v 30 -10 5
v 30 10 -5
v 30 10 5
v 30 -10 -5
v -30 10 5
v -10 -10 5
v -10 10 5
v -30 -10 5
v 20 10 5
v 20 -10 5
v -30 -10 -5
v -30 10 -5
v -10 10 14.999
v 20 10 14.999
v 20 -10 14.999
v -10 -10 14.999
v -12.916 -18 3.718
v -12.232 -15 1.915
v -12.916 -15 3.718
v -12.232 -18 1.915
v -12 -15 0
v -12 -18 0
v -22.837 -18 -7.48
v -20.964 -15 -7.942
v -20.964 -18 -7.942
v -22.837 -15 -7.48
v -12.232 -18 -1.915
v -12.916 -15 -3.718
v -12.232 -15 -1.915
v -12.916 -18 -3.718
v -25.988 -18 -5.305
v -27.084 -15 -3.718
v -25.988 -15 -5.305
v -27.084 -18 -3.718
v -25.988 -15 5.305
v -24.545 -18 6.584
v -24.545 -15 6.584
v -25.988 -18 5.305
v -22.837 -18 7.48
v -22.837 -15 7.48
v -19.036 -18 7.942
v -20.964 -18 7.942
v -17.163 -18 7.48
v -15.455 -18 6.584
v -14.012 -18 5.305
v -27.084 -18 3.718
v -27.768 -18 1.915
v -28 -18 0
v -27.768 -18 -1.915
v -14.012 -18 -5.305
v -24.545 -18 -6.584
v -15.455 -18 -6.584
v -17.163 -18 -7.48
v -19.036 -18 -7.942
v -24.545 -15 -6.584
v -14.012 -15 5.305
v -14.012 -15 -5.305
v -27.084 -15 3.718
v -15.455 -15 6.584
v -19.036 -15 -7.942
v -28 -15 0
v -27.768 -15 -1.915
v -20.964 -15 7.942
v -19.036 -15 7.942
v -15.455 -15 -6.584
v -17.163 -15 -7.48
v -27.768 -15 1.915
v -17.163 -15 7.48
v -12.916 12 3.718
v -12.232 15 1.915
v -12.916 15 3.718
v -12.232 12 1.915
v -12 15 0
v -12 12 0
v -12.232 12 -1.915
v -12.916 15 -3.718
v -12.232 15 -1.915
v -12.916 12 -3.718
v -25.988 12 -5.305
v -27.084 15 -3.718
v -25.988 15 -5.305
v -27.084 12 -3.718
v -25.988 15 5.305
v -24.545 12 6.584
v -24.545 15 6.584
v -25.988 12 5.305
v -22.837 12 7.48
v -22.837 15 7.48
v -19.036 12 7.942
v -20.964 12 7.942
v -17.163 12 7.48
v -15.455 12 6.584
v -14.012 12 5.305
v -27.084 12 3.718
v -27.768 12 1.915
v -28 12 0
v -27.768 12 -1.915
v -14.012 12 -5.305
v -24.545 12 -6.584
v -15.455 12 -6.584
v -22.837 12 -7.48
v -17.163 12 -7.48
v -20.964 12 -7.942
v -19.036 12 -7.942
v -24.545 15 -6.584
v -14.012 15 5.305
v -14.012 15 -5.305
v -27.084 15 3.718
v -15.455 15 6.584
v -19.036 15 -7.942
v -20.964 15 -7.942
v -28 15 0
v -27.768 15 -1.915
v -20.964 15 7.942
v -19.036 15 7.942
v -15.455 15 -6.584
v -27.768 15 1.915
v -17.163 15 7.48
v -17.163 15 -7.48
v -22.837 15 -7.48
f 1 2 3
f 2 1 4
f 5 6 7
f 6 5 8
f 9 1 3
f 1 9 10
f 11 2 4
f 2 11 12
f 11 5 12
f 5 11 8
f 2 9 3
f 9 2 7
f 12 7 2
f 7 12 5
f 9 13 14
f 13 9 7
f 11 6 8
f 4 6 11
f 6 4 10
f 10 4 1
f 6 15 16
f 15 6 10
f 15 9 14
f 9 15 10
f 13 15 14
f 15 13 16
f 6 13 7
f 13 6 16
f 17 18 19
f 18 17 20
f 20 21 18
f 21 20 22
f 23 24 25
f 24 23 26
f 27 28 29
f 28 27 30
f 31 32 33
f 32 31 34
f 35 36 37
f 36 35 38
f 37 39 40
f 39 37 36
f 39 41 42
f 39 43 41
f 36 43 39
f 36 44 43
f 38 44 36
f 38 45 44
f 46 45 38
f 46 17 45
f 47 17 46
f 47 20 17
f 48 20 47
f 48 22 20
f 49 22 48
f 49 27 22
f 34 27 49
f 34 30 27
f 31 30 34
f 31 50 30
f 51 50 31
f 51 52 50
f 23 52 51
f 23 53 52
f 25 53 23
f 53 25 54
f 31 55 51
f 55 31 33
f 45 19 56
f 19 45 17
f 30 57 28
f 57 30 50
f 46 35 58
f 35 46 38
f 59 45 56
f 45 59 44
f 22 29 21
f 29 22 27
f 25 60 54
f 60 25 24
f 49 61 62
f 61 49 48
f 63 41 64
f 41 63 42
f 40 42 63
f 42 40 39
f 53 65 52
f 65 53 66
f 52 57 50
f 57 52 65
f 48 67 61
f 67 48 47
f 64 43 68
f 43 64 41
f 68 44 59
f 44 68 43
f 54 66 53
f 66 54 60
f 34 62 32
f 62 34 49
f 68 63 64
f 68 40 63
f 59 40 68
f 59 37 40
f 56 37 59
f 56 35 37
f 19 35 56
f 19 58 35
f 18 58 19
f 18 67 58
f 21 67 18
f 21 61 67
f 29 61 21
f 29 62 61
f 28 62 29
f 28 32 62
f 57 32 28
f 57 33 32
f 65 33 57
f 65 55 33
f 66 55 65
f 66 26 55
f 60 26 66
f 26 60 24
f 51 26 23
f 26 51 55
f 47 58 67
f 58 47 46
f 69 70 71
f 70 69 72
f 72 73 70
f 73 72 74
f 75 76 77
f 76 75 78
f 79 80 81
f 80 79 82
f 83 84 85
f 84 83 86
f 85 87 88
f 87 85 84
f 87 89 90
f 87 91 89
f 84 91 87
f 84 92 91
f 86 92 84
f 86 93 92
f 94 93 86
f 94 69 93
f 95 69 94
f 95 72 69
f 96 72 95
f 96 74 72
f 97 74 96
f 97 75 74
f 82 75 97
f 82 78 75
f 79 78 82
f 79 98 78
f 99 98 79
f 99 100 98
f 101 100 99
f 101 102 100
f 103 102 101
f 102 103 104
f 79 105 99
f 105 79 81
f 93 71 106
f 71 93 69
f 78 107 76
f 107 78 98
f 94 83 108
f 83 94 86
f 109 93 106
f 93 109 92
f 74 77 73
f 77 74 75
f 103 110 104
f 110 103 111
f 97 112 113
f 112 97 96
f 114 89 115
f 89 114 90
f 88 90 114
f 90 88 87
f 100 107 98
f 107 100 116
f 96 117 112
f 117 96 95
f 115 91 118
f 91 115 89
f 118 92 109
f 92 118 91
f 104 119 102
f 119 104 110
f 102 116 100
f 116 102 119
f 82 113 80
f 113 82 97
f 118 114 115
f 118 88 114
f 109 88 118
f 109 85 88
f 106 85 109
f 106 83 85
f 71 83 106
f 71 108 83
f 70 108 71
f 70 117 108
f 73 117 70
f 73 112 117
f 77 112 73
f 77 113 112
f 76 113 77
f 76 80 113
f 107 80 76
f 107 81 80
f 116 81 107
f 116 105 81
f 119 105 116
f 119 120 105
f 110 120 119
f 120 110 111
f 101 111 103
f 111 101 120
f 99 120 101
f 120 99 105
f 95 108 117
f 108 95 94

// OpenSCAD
cube([60,20,10],center=true);
translate([5,0,10 - 0.001])
    cube([30,20,10],center=true);
translate([-20,-15,0])
    rotate([90,0,0])
    cylinder(h=3,r=8);
translate([-20,15,0])
    rotate([90,0,0])
    cylinder(h=3,r=8);
